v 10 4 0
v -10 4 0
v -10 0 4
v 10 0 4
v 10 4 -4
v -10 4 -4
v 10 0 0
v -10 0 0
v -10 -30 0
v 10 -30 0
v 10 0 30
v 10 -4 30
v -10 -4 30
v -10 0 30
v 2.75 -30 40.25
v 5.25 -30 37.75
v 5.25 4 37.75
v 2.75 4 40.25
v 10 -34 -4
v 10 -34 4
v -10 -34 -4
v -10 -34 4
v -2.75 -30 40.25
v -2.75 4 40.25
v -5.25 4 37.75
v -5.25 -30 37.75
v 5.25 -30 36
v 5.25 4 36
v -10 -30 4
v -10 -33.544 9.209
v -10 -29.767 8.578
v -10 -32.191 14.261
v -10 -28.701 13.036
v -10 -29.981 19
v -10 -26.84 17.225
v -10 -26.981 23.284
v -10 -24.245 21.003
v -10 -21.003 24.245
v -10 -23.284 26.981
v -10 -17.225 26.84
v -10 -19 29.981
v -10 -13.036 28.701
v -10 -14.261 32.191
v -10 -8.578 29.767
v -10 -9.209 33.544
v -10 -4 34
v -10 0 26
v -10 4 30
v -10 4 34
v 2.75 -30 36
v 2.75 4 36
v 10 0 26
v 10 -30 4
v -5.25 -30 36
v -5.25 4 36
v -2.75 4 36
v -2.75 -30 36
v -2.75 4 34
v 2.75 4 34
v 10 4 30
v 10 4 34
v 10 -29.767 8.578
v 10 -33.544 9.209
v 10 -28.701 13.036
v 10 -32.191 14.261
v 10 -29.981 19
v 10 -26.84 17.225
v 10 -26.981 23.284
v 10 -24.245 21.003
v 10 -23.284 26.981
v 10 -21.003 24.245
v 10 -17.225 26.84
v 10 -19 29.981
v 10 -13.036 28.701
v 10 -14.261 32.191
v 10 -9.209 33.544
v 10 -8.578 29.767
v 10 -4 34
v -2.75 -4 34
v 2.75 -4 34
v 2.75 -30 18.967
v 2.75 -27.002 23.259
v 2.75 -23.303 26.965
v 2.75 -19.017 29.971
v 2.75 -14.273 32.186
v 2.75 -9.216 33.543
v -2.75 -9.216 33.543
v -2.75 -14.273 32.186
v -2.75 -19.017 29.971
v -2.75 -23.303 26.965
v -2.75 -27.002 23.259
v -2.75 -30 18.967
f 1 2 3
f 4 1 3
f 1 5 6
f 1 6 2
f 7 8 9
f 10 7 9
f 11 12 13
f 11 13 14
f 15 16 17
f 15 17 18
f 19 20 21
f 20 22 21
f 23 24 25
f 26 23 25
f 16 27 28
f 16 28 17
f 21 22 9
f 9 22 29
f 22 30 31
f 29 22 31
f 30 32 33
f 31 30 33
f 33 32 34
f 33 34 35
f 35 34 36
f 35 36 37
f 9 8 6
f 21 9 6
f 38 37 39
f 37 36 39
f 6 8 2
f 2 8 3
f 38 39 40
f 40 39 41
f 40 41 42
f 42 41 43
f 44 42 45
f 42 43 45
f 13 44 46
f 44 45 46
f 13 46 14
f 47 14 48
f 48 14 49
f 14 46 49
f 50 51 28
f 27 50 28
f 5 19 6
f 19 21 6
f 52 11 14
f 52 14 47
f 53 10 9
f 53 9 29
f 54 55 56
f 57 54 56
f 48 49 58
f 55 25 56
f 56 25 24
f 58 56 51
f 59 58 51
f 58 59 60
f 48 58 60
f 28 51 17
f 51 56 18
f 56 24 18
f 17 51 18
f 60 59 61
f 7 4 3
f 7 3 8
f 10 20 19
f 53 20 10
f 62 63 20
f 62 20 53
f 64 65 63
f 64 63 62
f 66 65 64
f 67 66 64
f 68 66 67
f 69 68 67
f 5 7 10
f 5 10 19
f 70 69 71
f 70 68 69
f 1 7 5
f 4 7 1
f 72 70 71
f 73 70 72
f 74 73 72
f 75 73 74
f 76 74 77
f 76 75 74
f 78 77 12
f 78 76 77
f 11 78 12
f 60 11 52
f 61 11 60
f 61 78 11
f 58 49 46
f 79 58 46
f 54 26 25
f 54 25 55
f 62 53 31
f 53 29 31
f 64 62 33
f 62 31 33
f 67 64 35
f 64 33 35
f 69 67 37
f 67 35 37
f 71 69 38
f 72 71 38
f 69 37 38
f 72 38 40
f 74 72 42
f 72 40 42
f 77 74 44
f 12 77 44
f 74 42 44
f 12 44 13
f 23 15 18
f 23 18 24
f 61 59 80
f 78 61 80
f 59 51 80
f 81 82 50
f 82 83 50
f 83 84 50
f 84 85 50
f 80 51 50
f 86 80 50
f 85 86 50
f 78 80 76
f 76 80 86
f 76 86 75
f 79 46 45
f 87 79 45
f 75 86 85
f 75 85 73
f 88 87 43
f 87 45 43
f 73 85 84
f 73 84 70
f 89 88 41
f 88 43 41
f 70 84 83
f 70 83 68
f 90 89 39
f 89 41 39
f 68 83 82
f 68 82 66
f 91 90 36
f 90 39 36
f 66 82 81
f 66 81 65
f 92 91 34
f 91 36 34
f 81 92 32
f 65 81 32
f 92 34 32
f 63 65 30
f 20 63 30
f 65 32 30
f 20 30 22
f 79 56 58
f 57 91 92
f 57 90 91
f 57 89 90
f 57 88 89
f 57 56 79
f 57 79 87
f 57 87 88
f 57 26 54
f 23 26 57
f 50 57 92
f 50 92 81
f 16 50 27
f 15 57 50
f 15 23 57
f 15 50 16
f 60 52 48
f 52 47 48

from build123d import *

# Parameters (mm, degrees)
F1_DEPTH   = 10
F2_DEPTH   = 10
F4_DEPTH   = 30
F5_DEPTH   = 4
F4_FACE1_W = 5.5
F4_FACE1_H = 26


with BuildPart() as f1:
    # F0 (on Right) → F1 (new body)
    with BuildSketch(Plane.YZ):
        with BuildLine():
            Line((0, 0), (-30, 0))
            Line((-30, 0), (-30, 4))
            ThreePointArc((-30, 4), (-22.698520979, 22.698520979), (-4, 30))
            Line((-4, 30), (0, 30))
            Line((0, 30), (0, 26))
            Line((0, 26), (4, 30))
            Line((4, 30), (4, 34))
            Line((4, 34), (0, 34))
            Line((0, 34), (-4, 34))
            ThreePointArc((-4, 34), (-25.2132034356, 25.2132034356), (-34, 4))
            Line((-34, 4), (-34, -4))
            Line((-34, -4), (-30, -4))
            Line((-30, -4), (0, -4))
            Line((0, -4), (4, -4))
            Line((4, -4), (4, 0))
            Line((4, 0), (0, 4))
            Line((0, 4), (0, 0))
        make_face()
    extrude(amount=-F1_DEPTH)

    # F2 (add): a face of the model
    f2_faces = [f1.faces().sort_by_distance(p)[0] for p in [
        (0, 3.4625988463, 32),
    ]]
    extrude(f2_faces, amount=F2_DEPTH)

    # F3 (on Front) → F4 (join)
    with BuildSketch(Plane.XZ):
        Polygon((0, 34), (2.75, 34), (2.75, 36), (5.25, 36), (5.25, 37.75), (2.75, 40.25), (-2.75, 40.25), (-5.25, 37.75), (-5.25, 36), (-2.75, 36), (-2.75, 34), align=None)
    extrude(amount=F4_DEPTH)

    # F5 (add): a face of the model
    f5_faces = [f1.faces().sort_by_distance(p)[0] for p in [
        (0, 0, 37.2652953586),
    ]]
    extrude(f5_faces, amount=F5_DEPTH)

    # F4_face1 (on face) → F6 (join, up to the next surface of F1)
    with BuildSketch(Plane(origin=(0, -17, 34), x_dir=(1, 0, 0), z_dir=(0, 0, -1))):
        Rectangle(F4_FACE1_W, F4_FACE1_H)
    extrude(until=Until.NEXT)


solid = f1.part
